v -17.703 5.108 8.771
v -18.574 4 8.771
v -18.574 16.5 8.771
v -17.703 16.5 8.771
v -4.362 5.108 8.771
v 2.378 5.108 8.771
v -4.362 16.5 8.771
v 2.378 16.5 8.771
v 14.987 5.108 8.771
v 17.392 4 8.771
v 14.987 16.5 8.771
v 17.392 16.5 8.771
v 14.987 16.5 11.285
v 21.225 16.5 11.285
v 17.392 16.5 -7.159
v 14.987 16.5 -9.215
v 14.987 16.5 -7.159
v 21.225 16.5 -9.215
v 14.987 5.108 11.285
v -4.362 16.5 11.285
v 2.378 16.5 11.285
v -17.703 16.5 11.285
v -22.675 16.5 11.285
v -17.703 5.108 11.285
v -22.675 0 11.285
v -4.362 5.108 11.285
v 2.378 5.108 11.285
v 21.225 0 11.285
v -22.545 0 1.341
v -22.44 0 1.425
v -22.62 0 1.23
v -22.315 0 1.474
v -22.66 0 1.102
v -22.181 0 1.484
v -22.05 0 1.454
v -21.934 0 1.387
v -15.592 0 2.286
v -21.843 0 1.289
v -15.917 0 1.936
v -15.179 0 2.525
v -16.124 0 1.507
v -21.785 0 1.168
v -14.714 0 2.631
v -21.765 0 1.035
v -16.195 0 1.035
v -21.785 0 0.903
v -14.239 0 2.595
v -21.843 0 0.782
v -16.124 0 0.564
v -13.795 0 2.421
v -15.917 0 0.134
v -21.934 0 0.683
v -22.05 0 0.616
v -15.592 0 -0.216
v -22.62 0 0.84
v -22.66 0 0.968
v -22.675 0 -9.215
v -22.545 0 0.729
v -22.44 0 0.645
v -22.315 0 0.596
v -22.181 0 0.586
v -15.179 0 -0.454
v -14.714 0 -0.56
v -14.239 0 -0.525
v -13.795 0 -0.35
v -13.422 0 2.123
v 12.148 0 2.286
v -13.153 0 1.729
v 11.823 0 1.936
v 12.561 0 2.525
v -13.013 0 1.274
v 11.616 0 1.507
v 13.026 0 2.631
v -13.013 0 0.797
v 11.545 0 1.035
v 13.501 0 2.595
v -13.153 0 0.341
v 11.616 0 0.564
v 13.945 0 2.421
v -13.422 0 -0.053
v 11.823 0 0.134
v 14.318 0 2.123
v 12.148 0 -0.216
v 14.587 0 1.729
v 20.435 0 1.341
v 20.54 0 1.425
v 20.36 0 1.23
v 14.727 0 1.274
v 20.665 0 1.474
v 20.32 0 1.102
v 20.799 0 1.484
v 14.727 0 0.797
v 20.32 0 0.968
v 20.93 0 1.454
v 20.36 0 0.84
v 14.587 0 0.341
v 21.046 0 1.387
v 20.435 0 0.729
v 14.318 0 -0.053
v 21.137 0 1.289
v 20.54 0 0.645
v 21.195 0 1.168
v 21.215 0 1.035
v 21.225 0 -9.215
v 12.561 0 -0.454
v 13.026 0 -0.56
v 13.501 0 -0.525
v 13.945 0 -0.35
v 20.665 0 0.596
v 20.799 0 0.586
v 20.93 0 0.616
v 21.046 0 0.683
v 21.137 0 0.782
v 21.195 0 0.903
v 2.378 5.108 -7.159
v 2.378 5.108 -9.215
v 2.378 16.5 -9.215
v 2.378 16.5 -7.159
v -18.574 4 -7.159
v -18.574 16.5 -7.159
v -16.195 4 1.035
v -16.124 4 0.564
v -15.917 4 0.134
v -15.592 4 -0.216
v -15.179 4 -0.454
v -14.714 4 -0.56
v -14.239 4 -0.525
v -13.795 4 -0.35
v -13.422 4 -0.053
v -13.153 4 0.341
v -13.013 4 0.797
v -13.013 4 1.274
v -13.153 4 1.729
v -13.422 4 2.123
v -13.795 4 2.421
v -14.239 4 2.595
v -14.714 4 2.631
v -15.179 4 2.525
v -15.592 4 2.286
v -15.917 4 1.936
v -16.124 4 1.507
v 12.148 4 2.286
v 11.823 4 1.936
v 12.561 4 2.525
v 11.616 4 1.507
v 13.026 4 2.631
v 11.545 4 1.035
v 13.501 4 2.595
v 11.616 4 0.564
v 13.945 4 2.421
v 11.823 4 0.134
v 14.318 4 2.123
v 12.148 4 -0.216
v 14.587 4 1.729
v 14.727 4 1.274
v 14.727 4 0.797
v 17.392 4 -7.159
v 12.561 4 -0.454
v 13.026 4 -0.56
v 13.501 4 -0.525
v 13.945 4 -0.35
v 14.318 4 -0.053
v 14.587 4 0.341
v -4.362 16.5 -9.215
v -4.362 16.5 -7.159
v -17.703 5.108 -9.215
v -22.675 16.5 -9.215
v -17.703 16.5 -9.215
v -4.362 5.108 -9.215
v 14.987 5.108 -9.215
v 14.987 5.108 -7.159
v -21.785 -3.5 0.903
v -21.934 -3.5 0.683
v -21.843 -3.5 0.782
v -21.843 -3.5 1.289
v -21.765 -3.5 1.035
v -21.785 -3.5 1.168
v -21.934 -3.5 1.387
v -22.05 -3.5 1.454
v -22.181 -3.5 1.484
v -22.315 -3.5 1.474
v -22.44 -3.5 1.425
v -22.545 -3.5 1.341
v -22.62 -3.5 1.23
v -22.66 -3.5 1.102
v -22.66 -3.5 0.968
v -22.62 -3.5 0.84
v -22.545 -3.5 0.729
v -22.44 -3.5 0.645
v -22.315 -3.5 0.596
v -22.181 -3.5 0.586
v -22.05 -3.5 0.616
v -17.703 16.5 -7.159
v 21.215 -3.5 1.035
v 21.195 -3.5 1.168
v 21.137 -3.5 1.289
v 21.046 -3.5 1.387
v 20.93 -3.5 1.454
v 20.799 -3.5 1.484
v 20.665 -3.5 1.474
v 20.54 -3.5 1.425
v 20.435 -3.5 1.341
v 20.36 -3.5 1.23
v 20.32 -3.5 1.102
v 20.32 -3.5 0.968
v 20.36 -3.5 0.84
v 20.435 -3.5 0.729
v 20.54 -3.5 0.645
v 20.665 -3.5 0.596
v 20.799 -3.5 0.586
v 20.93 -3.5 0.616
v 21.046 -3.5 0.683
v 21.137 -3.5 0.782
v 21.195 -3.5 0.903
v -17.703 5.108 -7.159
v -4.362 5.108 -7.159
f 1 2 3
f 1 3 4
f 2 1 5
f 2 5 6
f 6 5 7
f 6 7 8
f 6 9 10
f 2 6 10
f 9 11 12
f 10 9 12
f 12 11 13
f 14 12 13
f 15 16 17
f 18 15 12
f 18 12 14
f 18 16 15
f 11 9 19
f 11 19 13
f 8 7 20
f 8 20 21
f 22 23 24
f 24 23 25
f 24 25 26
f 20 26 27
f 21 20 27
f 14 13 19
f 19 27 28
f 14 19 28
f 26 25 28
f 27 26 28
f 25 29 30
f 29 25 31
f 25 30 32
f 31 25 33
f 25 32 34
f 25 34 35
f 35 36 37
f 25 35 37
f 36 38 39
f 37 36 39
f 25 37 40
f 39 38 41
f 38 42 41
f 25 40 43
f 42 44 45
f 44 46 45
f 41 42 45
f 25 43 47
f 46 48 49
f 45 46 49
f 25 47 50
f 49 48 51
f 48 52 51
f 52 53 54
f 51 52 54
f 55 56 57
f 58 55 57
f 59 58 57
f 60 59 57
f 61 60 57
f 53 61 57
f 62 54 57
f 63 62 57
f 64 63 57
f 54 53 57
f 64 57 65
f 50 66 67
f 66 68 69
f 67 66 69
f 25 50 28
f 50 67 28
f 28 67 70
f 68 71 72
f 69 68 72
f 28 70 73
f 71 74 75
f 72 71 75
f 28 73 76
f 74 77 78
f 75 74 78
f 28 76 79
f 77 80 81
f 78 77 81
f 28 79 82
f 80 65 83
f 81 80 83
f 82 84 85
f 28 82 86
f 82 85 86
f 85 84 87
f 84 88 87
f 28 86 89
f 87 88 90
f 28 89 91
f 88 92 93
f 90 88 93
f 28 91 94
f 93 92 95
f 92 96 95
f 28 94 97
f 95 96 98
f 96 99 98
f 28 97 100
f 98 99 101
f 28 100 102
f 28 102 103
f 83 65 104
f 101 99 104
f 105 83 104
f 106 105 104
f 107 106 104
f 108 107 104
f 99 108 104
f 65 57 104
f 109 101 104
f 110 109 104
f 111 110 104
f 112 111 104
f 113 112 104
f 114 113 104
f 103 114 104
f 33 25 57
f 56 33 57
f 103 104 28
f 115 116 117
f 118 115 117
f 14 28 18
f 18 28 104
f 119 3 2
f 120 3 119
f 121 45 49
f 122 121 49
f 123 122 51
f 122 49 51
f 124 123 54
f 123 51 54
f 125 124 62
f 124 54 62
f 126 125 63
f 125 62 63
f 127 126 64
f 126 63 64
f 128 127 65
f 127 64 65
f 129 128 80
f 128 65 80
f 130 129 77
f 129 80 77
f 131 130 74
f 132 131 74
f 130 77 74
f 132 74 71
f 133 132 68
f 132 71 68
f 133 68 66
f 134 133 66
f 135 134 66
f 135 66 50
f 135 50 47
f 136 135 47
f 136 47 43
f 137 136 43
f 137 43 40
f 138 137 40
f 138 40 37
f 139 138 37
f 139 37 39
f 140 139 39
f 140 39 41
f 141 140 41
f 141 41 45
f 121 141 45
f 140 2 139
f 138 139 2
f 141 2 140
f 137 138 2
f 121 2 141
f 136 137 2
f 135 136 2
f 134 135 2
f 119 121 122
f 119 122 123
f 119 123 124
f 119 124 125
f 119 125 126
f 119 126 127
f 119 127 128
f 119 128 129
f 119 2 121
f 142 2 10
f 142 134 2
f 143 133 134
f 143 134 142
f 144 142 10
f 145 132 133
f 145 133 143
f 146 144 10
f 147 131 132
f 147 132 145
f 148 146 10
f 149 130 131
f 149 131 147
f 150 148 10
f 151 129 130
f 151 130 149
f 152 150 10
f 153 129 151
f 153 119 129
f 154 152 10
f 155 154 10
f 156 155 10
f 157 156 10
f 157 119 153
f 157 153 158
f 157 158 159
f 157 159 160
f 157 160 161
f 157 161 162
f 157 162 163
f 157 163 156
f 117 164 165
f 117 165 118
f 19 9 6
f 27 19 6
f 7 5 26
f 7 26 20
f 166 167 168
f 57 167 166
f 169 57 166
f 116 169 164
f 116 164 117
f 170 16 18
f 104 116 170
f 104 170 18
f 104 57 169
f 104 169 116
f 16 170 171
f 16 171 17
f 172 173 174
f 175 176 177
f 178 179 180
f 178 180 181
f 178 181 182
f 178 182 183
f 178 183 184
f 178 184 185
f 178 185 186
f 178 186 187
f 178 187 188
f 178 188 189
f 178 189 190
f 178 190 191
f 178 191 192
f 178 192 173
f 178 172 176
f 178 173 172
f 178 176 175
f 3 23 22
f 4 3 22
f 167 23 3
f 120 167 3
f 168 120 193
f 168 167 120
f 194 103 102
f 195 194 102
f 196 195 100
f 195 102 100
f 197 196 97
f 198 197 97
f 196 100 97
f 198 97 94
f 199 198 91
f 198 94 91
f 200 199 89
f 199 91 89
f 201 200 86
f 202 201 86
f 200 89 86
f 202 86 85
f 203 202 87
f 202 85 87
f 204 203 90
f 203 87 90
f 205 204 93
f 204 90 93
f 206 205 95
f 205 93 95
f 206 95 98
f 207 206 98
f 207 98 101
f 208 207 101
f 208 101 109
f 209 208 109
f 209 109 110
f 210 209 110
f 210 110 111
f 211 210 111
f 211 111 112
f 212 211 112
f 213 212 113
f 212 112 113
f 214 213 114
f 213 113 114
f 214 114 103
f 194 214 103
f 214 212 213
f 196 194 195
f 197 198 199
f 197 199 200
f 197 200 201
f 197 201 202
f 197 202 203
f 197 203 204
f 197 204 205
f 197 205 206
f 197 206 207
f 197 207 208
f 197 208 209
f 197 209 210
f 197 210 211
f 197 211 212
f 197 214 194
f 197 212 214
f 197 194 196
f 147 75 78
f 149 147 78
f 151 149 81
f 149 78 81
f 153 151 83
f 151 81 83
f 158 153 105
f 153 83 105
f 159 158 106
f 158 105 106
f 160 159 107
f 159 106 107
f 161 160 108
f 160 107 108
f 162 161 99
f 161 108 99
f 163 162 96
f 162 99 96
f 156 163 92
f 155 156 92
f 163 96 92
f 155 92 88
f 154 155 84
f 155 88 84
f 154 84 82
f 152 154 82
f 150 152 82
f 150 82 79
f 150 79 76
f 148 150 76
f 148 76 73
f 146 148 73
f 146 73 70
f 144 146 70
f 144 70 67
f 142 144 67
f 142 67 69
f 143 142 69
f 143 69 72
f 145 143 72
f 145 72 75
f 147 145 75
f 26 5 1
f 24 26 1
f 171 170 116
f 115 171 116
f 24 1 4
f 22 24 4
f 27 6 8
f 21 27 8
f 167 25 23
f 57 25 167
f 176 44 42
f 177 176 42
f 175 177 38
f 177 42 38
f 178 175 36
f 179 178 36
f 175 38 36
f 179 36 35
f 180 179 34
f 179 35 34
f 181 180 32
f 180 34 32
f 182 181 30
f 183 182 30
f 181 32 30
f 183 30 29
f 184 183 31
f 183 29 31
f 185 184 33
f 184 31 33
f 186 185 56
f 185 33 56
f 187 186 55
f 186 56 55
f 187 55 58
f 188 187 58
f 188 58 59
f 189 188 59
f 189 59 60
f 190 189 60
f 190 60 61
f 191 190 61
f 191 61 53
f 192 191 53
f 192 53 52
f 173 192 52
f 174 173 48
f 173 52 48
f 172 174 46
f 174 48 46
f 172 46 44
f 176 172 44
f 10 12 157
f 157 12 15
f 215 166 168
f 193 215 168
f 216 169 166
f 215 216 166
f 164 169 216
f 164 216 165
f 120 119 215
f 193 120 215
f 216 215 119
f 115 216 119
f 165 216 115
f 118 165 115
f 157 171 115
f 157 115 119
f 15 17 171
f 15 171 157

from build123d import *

# Parameters (mm, degrees)
SKETCH1_W           = 43.9
SKETCH1_H           = 20.5
BOSS_EXTRUDE1_DEPTH = 16.5
SKETCH3_R           = 1.6
CUT_EXTRUDE1_DEPTH  = 6.5
SKETCH5_W           = 35.96646031
SKETCH5_H           = 15.929900813
CUT_EXTRUDE3_DEPTH  = 12.5
SKETCH4_W           = 12.608694843
SKETCH4_H           = 15.64948953
SKETCH4_W_2         = 13.340907584
CUT_EXTRUDE4_DEPTH  = 28.5
SKETCH6_R           = 0.45
BOSS_EXTRUDE2_DEPTH = 3.5


with BuildPart() as part:
    # Sketch1 → Boss-Extrude1 (new body)
    with BuildSketch(Plane(origin=(0, 0, 0), x_dir=(1, 0, 0), z_dir=(0, 1, 0))):
        with Locations((-0.724764151, -1.035141509)):
            Rectangle(SKETCH1_W, SKETCH1_H)
    extrude(amount=BOSS_EXTRUDE1_DEPTH)

    # Sketch3 → Cut-Extrude1 (cut)
    with BuildSketch(Plane(origin=(0, 0, 0), x_dir=(-1, 0, 0), z_dir=(0, -1, 0))):
        with Locations((-13.145235849, -1.035141509)):
            Circle(SKETCH3_R)
        with Locations((14.594764151, -1.035141509)):
            Circle(SKETCH3_R)
    extrude(amount=-CUT_EXTRUDE1_DEPTH, mode=Mode.SUBTRACT)

    # Sketch5 → Cut-Extrude3 (cut)
    with BuildSketch(Plane(origin=(0, 16.5, 0), x_dir=(1, 0, 0), z_dir=(0, 1, 0))):
        with Locations((-0.591045911, -0.805962597)):
            Rectangle(SKETCH5_W, SKETCH5_H)
    extrude(amount=-CUT_EXTRUDE3_DEPTH, mode=Mode.SUBTRACT)

    # Sketch4 → Cut-Extrude4 (cut)
    with BuildSketch(Plane(origin=(0, 0, -9.214858491), x_dir=(-1, 0, 0), z_dir=(0, 0, -1))):
        with Locations((-8.682774774, 12.932468191)):
            Rectangle(SKETCH4_W, SKETCH4_H)
        with Locations((11.03272818, 12.932468191)):
            Rectangle(SKETCH4_W_2, SKETCH4_H)
    extrude(amount=-CUT_EXTRUDE4_DEPTH, mode=Mode.SUBTRACT)

    # Sketch6 → Boss-Extrude2 (add)
    with BuildSketch(Plane.XZ):
        with Locations((20.765235849, 1.035141509)):
            Circle(SKETCH6_R)
        with Locations((-22.214764151, 1.035141509)):
            Circle(SKETCH6_R)
    extrude(amount=BOSS_EXTRUDE2_DEPTH)


solid = part.part
